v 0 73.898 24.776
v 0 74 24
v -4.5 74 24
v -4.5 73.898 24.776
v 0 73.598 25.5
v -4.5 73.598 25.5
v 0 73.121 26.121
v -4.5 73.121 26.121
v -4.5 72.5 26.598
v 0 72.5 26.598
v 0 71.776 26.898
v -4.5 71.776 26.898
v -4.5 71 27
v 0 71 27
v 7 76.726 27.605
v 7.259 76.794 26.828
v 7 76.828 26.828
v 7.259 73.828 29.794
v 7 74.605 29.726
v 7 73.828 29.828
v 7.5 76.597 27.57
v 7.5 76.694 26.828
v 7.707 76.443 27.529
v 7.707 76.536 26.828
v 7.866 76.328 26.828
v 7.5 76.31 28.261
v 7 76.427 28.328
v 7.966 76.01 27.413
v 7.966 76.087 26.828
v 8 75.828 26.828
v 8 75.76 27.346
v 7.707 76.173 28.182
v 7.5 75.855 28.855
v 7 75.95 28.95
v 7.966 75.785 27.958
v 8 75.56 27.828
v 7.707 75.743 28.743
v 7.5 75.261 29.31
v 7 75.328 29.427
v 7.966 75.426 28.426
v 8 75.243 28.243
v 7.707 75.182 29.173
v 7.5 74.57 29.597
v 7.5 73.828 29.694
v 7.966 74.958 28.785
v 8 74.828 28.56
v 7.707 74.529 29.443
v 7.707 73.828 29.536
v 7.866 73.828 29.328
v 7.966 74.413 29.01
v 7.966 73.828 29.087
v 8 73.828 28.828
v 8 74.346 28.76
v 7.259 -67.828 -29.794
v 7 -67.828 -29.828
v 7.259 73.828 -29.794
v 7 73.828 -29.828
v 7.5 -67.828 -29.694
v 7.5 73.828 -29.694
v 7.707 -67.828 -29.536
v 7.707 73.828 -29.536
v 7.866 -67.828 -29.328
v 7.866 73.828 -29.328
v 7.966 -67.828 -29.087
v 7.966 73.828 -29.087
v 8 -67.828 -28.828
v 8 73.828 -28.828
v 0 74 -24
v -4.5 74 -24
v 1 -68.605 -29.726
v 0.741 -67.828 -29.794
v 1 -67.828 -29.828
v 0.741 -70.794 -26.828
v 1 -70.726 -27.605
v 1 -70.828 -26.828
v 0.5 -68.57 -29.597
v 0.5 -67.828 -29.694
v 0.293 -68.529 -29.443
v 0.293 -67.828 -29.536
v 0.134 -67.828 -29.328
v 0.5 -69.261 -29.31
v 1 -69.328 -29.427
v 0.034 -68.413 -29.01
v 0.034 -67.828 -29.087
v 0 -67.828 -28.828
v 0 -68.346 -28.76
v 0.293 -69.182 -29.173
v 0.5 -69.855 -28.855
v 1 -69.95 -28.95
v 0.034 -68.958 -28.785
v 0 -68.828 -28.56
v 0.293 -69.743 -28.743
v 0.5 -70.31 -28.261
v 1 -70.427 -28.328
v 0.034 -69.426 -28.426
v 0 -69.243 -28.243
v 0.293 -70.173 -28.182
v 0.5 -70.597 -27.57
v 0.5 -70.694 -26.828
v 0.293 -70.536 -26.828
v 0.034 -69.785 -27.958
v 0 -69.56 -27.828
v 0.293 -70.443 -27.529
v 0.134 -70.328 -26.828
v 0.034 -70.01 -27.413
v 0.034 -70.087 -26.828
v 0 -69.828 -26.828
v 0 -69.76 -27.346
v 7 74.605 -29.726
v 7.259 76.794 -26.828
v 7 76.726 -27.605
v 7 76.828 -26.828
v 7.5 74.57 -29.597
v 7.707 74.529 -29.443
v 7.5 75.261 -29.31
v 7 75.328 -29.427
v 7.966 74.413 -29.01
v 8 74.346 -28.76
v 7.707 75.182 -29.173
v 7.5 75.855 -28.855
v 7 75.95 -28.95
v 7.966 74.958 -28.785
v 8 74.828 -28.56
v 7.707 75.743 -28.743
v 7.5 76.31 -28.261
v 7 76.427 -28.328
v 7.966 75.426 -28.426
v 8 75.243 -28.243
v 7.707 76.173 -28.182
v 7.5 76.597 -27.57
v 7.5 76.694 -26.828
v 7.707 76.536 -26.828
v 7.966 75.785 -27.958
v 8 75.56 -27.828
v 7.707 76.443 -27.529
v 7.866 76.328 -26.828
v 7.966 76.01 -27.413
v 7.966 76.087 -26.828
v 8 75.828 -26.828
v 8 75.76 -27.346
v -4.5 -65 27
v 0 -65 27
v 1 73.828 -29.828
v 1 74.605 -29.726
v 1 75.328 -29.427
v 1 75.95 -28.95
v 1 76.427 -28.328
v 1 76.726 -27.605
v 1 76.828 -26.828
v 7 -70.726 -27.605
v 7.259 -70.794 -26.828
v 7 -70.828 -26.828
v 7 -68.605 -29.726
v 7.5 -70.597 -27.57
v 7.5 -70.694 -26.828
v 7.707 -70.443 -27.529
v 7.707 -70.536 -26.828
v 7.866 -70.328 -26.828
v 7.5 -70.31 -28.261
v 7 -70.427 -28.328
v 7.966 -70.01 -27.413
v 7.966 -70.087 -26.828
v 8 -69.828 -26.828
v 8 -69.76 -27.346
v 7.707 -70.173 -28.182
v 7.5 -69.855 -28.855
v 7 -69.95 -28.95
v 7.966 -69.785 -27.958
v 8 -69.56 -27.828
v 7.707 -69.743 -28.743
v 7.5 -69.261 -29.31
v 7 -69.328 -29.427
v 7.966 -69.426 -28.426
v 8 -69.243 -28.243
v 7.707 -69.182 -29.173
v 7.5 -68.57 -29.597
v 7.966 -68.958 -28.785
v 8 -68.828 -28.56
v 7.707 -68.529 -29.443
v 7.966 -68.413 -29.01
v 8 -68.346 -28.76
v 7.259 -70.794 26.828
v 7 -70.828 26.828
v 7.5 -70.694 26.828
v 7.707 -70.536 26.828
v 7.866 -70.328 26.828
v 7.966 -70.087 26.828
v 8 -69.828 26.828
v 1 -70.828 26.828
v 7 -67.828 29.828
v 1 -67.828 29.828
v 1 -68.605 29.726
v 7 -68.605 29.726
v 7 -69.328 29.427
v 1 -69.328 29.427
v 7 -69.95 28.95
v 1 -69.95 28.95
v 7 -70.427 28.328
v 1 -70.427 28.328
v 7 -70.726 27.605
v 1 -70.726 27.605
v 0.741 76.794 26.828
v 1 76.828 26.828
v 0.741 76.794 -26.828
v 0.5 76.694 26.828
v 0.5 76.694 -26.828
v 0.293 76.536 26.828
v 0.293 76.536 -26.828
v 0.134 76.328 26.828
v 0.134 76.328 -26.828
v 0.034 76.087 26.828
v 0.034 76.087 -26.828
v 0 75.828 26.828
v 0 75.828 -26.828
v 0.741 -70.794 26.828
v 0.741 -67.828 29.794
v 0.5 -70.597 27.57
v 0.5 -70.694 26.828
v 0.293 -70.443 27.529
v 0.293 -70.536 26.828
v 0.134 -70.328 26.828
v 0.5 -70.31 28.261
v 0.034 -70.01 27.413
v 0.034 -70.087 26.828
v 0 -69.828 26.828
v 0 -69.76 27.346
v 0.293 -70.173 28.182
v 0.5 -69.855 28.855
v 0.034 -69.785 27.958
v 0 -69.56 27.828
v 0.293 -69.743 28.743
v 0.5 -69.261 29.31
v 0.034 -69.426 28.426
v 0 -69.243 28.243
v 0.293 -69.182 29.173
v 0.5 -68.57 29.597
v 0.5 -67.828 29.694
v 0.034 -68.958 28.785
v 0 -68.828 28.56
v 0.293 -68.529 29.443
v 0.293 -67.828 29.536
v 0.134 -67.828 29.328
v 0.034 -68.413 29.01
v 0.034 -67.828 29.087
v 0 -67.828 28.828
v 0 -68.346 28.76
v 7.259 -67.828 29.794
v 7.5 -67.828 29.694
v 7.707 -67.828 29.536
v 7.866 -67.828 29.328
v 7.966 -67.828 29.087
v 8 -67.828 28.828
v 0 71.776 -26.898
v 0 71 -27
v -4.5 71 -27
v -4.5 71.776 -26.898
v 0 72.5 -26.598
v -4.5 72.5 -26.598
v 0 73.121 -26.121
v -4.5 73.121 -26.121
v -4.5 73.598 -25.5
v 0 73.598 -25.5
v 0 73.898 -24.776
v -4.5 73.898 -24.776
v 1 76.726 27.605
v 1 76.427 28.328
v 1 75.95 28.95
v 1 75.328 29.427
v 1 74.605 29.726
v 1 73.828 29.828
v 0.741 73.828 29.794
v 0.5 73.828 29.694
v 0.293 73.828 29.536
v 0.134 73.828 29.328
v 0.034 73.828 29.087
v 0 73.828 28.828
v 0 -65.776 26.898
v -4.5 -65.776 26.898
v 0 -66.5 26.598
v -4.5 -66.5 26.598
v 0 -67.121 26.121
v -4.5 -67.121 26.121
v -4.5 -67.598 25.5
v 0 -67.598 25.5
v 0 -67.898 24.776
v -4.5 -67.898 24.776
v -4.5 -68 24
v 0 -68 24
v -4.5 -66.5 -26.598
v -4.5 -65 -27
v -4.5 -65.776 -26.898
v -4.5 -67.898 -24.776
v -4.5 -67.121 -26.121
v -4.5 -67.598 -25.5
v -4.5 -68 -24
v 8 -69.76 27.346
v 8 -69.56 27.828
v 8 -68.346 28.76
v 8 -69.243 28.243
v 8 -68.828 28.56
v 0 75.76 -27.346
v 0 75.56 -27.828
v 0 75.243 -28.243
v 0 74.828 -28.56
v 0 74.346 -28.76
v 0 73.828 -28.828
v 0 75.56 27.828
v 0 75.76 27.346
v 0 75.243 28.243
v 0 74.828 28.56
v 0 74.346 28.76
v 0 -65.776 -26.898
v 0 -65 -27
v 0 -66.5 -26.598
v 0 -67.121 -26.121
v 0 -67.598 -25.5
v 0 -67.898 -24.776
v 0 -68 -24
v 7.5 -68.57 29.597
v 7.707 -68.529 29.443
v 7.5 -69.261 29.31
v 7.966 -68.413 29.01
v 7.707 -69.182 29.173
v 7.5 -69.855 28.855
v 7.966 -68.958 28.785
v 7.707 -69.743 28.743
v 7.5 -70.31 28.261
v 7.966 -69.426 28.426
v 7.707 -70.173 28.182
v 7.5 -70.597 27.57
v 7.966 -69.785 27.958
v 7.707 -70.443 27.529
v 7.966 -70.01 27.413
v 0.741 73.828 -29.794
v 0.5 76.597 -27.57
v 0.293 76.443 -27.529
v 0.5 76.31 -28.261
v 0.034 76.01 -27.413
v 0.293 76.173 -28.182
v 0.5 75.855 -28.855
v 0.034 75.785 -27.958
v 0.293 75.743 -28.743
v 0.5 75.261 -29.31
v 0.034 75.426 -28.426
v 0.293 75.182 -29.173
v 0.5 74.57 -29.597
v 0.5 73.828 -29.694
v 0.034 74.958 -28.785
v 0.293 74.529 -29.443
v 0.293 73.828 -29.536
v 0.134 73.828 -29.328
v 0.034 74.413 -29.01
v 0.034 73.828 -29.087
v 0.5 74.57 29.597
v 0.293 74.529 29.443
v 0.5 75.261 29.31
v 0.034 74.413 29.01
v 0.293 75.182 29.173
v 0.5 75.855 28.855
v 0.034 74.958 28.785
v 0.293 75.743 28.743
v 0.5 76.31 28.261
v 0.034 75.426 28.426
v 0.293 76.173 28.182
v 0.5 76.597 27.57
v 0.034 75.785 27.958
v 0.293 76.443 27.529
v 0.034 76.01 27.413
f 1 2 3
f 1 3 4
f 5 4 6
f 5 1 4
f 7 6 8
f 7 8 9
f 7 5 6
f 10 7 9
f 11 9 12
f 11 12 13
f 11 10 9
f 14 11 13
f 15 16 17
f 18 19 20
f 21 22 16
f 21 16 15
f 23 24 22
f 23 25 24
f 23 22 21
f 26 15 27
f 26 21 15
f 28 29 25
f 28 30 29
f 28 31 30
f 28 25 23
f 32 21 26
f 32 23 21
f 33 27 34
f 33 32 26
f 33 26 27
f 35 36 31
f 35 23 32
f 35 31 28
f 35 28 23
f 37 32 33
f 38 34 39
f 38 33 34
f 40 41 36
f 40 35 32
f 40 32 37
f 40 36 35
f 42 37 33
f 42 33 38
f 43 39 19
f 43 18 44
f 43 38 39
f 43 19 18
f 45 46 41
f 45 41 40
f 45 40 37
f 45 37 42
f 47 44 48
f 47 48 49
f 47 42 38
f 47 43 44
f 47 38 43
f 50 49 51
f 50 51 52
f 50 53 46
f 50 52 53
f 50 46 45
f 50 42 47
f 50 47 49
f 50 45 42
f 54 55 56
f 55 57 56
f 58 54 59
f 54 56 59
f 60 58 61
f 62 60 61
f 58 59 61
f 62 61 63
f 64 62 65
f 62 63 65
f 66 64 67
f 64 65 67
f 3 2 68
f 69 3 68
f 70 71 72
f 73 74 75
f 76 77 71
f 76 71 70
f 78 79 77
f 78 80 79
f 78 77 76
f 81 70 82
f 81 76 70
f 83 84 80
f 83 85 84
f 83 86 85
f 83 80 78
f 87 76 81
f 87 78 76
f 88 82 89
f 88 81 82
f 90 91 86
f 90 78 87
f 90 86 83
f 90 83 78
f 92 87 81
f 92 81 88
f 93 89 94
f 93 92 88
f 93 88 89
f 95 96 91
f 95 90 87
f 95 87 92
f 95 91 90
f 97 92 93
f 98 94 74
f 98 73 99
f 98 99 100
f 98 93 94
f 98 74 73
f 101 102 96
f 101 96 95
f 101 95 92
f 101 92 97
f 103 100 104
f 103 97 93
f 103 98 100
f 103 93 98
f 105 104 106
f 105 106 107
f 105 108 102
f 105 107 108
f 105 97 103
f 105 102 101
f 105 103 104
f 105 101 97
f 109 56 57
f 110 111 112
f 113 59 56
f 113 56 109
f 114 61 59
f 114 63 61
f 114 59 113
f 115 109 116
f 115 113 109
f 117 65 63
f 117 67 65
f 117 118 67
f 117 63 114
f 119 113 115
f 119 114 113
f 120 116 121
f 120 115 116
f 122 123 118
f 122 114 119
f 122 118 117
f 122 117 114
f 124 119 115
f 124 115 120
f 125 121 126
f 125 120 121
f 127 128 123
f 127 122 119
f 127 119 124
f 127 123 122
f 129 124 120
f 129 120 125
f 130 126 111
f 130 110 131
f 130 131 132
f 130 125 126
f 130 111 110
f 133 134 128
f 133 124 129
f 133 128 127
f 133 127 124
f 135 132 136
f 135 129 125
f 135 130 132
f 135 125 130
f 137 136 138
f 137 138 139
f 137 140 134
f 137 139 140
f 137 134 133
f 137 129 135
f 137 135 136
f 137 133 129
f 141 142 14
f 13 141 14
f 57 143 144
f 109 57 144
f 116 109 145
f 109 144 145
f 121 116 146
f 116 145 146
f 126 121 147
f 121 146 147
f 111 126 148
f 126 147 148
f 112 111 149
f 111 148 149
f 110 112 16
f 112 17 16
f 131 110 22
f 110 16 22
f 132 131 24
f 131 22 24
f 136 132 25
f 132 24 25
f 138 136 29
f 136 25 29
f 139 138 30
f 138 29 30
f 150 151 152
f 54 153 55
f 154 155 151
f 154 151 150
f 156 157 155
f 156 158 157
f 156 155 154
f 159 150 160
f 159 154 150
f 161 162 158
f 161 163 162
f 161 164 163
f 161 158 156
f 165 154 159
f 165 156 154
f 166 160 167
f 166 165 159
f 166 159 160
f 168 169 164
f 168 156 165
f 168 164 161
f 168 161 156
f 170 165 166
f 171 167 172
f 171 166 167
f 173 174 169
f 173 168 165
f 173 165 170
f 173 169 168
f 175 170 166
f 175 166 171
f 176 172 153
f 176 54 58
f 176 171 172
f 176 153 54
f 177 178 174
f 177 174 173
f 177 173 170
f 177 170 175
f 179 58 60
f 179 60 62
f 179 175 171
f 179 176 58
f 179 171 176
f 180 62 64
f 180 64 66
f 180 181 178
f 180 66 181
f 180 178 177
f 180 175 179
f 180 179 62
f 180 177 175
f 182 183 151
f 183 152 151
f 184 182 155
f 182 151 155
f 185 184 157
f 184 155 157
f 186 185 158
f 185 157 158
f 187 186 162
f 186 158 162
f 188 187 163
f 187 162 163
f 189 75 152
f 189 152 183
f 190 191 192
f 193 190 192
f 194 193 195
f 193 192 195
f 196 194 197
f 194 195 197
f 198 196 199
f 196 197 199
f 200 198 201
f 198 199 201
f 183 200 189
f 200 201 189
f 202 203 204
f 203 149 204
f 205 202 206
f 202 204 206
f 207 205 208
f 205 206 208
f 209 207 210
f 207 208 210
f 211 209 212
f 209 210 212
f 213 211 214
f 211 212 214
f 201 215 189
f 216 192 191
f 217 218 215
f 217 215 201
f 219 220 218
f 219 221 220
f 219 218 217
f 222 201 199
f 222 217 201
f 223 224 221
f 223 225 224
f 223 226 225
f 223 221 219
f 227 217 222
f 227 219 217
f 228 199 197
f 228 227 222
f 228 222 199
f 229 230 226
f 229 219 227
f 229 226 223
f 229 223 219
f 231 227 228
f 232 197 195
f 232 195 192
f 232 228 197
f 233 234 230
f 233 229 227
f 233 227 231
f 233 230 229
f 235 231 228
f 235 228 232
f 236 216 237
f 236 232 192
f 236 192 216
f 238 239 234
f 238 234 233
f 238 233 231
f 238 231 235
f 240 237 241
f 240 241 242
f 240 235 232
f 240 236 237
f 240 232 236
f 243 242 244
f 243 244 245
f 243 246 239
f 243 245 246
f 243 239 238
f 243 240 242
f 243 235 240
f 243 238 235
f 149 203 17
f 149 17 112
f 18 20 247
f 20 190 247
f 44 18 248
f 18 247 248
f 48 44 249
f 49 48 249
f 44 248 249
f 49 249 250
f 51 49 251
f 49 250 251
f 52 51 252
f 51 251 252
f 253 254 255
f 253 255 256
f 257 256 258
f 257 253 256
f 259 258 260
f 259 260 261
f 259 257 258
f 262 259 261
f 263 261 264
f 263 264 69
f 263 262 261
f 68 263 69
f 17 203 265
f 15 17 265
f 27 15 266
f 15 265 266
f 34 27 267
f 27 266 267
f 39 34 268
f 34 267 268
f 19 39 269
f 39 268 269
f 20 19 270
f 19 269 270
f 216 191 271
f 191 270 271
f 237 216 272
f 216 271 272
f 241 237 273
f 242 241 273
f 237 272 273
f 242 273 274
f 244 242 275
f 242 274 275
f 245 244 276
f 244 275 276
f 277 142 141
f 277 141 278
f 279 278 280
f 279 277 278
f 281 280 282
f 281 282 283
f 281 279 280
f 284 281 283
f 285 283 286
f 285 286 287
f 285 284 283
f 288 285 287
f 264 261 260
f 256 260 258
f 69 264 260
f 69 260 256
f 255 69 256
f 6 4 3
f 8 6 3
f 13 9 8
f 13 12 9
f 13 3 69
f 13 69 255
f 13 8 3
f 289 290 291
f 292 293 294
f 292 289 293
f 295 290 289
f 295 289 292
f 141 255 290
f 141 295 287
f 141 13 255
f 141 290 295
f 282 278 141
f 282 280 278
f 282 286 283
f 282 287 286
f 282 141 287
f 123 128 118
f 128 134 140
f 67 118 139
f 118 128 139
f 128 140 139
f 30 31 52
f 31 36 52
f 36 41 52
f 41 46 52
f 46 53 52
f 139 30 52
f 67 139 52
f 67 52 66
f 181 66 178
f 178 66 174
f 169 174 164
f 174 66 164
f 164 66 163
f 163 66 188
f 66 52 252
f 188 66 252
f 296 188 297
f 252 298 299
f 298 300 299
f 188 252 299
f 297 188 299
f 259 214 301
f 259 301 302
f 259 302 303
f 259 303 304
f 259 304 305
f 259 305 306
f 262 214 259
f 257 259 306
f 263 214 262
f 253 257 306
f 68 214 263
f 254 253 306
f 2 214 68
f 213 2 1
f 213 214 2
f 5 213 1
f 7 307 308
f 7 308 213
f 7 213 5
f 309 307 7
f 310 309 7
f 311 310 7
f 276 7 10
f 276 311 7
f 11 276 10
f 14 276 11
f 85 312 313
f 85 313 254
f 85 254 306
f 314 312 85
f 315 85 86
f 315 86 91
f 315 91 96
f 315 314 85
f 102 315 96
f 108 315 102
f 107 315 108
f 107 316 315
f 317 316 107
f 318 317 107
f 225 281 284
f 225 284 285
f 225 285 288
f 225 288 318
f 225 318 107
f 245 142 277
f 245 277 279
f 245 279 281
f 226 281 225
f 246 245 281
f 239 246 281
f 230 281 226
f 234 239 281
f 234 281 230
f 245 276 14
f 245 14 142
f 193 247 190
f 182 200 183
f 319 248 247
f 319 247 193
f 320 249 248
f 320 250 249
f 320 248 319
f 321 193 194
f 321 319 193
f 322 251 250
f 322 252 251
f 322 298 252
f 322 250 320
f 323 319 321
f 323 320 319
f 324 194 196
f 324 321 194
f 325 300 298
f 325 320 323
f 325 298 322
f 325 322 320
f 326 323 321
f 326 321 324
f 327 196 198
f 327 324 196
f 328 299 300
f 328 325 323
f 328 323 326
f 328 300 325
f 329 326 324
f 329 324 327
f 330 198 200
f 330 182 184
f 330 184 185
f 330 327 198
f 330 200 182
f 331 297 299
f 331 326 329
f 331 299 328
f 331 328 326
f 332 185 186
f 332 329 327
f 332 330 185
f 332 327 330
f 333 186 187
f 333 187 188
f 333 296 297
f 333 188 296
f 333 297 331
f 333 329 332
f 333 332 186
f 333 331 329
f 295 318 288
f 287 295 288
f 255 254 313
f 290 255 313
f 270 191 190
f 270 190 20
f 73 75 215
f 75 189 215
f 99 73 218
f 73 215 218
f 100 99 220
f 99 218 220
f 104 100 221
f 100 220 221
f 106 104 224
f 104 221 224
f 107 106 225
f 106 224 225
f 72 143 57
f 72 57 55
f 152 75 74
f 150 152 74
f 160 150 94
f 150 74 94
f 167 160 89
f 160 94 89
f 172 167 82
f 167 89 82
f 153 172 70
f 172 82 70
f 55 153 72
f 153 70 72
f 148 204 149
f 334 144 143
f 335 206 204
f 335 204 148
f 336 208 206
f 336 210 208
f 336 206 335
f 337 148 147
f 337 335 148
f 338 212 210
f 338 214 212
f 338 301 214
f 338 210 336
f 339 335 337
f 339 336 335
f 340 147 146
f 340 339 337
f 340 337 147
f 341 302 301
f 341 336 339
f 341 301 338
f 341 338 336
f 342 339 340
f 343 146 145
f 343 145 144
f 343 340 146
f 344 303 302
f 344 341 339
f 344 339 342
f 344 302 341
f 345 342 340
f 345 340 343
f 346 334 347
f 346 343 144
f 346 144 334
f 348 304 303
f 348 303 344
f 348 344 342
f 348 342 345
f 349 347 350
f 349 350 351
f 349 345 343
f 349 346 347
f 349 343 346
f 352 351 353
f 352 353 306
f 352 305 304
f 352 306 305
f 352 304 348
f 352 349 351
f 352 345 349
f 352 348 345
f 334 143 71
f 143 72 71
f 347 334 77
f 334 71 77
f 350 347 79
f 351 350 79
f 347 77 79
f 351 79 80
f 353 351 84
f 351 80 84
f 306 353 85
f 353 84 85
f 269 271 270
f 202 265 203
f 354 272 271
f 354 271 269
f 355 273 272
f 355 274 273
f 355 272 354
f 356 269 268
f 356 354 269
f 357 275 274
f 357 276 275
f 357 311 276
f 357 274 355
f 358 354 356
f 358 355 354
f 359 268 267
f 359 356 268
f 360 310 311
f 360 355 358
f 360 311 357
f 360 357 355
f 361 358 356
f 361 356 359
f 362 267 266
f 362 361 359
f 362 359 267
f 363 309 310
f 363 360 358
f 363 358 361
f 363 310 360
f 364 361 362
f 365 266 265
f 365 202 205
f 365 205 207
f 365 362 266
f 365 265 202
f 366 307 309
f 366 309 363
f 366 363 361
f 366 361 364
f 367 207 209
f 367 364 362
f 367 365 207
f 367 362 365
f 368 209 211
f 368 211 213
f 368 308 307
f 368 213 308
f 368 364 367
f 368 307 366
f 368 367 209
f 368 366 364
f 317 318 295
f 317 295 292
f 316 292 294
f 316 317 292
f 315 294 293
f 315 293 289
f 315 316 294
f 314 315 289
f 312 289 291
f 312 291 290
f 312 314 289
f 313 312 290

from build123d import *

# Parameters (mm, degrees)
PAD_DEPTH    = 4.5
PAD001_DEPTH = 8
FILLET_R     = 1


with BuildPart() as part:
    # Sketch → Pad (new body)
    with BuildSketch(Plane.YZ):
        with BuildLine():
            Line((-65, 27), (71, 27))
            ThreePointArc((74, 24), (73.12132, 26.12132), (71, 27))
            Line((74, 24), (74, -24))
            ThreePointArc((71, -27), (73.12132, -26.12132), (74, -24))
            Line((71, -27), (-65, -27))
            ThreePointArc((-68, -24), (-67.12132, -26.12132), (-65, -27))
            Line((-68, -24), (-68, 24))
            ThreePointArc((-65, 27), (-67.12132, 26.12132), (-68, 24))
        make_face()
    extrude(amount=-PAD_DEPTH)

    # Sketch001 → Pad001 (join)
    with BuildSketch(Plane.YZ):
        with BuildLine():
            Line((-67.828427, 29.828427), (73.828427, 29.828427))
            ThreePointArc((76.828427, 26.828427), (75.949747, 28.949747), (73.828427, 29.828427))
            Line((76.828427, 26.828427), (76.828427, -26.828427))
            ThreePointArc((73.828427, -29.828427), (75.949747, -28.949747), (76.828427, -26.828427))
            Line((73.828427, -29.828427), (-67.828427, -29.828427))
            ThreePointArc((-70.828427, -26.828427), (-69.949747, -28.949747), (-67.828427, -29.828427))
            Line((-70.828427, -26.828427), (-70.828427, 26.828427))
            ThreePointArc((-67.828427, 29.828427), (-69.949747, 28.949747), (-70.828427, 26.828427))
        make_face()
    extrude(amount=PAD001_DEPTH)

    # Fillet
    fillet_edges = [part.edges().sort_by_distance(p)[0] for p in [
        (0, 3, 29.828427),
        (0, -69.949747, 28.949747),
        (0, -70.828427, 0),
        (8, -69.949747, 28.949747),
        (8, -70.828427, 0),
        (8, 3, 29.828427),
        (0, -69.949747, -28.949747),
        (8, -69.949747, -28.949747),
        (8, 3, -29.828427),
        (0, 3, -29.828427),
        (0, 75.949747, -28.949747),
        (8, 75.949747, -28.949747),
        (0, 76.828427, 0),
        (8, 76.828427, 0),
        (0, 75.949747, 28.949747),
        (8, 75.949747, 28.949747),
    ]]
    fillet(fillet_edges, radius=FILLET_R)


solid = part.part
